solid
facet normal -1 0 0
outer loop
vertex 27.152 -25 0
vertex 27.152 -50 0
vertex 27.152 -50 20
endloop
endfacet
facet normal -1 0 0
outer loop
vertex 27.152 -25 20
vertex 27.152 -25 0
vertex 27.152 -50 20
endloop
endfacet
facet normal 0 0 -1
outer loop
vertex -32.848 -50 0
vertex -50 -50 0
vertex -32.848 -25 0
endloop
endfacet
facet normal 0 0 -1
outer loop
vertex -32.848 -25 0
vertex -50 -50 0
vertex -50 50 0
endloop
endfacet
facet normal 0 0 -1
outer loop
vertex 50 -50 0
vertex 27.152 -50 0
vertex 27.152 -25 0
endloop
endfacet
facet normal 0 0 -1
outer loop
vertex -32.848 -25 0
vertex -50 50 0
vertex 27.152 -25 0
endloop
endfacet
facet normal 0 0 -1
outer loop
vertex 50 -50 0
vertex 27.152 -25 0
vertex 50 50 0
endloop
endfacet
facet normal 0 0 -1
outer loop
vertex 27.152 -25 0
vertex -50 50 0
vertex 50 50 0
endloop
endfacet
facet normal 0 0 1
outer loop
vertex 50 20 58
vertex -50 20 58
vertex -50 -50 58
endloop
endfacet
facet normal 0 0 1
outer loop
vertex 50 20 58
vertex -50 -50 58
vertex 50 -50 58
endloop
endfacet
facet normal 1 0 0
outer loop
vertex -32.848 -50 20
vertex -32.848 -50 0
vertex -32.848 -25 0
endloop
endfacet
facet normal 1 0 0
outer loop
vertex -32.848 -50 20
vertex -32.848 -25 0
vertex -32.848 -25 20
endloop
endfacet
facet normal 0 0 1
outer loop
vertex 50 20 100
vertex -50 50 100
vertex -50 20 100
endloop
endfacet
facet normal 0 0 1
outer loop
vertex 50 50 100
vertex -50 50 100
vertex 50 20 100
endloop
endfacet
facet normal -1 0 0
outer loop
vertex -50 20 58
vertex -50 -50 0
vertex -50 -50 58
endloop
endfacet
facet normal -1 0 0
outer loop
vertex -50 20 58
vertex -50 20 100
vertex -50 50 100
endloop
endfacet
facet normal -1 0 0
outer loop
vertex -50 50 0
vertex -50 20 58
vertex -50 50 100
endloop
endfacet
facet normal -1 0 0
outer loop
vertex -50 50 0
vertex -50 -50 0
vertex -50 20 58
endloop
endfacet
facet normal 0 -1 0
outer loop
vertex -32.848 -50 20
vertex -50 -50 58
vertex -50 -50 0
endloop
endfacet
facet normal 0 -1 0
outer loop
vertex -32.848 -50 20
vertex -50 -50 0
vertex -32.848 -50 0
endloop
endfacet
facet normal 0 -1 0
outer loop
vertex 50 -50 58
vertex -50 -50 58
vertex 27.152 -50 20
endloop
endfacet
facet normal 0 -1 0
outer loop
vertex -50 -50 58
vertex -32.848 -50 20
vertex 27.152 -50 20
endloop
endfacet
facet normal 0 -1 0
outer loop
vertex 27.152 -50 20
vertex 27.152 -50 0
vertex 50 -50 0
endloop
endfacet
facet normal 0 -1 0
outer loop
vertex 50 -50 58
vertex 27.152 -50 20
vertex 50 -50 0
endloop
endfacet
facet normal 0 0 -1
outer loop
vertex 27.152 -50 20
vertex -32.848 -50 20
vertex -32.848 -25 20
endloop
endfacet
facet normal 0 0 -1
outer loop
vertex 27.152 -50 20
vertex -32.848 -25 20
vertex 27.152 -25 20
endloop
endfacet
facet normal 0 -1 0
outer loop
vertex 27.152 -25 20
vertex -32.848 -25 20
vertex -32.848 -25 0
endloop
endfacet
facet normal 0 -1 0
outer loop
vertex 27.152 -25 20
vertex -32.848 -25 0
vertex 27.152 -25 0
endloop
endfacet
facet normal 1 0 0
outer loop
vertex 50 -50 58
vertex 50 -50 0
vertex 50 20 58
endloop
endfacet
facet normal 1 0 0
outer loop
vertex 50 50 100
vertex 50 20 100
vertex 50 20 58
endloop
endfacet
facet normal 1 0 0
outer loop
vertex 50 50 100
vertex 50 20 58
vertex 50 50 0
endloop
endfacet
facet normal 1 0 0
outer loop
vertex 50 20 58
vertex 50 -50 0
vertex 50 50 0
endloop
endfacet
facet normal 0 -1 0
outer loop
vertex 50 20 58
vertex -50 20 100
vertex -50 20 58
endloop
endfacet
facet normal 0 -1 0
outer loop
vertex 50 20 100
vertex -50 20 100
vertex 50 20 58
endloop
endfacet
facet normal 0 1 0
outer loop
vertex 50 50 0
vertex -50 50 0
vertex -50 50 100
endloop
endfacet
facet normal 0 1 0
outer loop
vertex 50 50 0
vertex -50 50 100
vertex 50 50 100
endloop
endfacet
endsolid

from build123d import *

# Parameters (mm, degrees)
F0_W     = 100
F0_H     = 100
F1_DEPTH = 100
F2_W     = 100
F2_H     = 70
F3_DEPTH = 42
F4_W     = 60
F4_H     = 20
F5_DEPTH = 25


with BuildPart() as f1:
    # F0 (on Top) → F1 (new body)
    with BuildSketch(Plane.XY):
        Rectangle(F0_W, F0_H)
    extrude(amount=F1_DEPTH)

    # F2 (on face) → F3 (cut)
    with BuildSketch(Plane.XY.offset(100)):
        with Locations((0, -15)):
            Rectangle(F2_W, F2_H)
    extrude(amount=-F3_DEPTH, mode=Mode.SUBTRACT)

    # F4 (on face) → F5 (cut)
    with BuildSketch(Plane.XZ.offset(50)):
        with Locations((-2.848295, 10)):
            Rectangle(F4_W, F4_H)
    extrude(amount=-F5_DEPTH, mode=Mode.SUBTRACT)


solid = f1.part
